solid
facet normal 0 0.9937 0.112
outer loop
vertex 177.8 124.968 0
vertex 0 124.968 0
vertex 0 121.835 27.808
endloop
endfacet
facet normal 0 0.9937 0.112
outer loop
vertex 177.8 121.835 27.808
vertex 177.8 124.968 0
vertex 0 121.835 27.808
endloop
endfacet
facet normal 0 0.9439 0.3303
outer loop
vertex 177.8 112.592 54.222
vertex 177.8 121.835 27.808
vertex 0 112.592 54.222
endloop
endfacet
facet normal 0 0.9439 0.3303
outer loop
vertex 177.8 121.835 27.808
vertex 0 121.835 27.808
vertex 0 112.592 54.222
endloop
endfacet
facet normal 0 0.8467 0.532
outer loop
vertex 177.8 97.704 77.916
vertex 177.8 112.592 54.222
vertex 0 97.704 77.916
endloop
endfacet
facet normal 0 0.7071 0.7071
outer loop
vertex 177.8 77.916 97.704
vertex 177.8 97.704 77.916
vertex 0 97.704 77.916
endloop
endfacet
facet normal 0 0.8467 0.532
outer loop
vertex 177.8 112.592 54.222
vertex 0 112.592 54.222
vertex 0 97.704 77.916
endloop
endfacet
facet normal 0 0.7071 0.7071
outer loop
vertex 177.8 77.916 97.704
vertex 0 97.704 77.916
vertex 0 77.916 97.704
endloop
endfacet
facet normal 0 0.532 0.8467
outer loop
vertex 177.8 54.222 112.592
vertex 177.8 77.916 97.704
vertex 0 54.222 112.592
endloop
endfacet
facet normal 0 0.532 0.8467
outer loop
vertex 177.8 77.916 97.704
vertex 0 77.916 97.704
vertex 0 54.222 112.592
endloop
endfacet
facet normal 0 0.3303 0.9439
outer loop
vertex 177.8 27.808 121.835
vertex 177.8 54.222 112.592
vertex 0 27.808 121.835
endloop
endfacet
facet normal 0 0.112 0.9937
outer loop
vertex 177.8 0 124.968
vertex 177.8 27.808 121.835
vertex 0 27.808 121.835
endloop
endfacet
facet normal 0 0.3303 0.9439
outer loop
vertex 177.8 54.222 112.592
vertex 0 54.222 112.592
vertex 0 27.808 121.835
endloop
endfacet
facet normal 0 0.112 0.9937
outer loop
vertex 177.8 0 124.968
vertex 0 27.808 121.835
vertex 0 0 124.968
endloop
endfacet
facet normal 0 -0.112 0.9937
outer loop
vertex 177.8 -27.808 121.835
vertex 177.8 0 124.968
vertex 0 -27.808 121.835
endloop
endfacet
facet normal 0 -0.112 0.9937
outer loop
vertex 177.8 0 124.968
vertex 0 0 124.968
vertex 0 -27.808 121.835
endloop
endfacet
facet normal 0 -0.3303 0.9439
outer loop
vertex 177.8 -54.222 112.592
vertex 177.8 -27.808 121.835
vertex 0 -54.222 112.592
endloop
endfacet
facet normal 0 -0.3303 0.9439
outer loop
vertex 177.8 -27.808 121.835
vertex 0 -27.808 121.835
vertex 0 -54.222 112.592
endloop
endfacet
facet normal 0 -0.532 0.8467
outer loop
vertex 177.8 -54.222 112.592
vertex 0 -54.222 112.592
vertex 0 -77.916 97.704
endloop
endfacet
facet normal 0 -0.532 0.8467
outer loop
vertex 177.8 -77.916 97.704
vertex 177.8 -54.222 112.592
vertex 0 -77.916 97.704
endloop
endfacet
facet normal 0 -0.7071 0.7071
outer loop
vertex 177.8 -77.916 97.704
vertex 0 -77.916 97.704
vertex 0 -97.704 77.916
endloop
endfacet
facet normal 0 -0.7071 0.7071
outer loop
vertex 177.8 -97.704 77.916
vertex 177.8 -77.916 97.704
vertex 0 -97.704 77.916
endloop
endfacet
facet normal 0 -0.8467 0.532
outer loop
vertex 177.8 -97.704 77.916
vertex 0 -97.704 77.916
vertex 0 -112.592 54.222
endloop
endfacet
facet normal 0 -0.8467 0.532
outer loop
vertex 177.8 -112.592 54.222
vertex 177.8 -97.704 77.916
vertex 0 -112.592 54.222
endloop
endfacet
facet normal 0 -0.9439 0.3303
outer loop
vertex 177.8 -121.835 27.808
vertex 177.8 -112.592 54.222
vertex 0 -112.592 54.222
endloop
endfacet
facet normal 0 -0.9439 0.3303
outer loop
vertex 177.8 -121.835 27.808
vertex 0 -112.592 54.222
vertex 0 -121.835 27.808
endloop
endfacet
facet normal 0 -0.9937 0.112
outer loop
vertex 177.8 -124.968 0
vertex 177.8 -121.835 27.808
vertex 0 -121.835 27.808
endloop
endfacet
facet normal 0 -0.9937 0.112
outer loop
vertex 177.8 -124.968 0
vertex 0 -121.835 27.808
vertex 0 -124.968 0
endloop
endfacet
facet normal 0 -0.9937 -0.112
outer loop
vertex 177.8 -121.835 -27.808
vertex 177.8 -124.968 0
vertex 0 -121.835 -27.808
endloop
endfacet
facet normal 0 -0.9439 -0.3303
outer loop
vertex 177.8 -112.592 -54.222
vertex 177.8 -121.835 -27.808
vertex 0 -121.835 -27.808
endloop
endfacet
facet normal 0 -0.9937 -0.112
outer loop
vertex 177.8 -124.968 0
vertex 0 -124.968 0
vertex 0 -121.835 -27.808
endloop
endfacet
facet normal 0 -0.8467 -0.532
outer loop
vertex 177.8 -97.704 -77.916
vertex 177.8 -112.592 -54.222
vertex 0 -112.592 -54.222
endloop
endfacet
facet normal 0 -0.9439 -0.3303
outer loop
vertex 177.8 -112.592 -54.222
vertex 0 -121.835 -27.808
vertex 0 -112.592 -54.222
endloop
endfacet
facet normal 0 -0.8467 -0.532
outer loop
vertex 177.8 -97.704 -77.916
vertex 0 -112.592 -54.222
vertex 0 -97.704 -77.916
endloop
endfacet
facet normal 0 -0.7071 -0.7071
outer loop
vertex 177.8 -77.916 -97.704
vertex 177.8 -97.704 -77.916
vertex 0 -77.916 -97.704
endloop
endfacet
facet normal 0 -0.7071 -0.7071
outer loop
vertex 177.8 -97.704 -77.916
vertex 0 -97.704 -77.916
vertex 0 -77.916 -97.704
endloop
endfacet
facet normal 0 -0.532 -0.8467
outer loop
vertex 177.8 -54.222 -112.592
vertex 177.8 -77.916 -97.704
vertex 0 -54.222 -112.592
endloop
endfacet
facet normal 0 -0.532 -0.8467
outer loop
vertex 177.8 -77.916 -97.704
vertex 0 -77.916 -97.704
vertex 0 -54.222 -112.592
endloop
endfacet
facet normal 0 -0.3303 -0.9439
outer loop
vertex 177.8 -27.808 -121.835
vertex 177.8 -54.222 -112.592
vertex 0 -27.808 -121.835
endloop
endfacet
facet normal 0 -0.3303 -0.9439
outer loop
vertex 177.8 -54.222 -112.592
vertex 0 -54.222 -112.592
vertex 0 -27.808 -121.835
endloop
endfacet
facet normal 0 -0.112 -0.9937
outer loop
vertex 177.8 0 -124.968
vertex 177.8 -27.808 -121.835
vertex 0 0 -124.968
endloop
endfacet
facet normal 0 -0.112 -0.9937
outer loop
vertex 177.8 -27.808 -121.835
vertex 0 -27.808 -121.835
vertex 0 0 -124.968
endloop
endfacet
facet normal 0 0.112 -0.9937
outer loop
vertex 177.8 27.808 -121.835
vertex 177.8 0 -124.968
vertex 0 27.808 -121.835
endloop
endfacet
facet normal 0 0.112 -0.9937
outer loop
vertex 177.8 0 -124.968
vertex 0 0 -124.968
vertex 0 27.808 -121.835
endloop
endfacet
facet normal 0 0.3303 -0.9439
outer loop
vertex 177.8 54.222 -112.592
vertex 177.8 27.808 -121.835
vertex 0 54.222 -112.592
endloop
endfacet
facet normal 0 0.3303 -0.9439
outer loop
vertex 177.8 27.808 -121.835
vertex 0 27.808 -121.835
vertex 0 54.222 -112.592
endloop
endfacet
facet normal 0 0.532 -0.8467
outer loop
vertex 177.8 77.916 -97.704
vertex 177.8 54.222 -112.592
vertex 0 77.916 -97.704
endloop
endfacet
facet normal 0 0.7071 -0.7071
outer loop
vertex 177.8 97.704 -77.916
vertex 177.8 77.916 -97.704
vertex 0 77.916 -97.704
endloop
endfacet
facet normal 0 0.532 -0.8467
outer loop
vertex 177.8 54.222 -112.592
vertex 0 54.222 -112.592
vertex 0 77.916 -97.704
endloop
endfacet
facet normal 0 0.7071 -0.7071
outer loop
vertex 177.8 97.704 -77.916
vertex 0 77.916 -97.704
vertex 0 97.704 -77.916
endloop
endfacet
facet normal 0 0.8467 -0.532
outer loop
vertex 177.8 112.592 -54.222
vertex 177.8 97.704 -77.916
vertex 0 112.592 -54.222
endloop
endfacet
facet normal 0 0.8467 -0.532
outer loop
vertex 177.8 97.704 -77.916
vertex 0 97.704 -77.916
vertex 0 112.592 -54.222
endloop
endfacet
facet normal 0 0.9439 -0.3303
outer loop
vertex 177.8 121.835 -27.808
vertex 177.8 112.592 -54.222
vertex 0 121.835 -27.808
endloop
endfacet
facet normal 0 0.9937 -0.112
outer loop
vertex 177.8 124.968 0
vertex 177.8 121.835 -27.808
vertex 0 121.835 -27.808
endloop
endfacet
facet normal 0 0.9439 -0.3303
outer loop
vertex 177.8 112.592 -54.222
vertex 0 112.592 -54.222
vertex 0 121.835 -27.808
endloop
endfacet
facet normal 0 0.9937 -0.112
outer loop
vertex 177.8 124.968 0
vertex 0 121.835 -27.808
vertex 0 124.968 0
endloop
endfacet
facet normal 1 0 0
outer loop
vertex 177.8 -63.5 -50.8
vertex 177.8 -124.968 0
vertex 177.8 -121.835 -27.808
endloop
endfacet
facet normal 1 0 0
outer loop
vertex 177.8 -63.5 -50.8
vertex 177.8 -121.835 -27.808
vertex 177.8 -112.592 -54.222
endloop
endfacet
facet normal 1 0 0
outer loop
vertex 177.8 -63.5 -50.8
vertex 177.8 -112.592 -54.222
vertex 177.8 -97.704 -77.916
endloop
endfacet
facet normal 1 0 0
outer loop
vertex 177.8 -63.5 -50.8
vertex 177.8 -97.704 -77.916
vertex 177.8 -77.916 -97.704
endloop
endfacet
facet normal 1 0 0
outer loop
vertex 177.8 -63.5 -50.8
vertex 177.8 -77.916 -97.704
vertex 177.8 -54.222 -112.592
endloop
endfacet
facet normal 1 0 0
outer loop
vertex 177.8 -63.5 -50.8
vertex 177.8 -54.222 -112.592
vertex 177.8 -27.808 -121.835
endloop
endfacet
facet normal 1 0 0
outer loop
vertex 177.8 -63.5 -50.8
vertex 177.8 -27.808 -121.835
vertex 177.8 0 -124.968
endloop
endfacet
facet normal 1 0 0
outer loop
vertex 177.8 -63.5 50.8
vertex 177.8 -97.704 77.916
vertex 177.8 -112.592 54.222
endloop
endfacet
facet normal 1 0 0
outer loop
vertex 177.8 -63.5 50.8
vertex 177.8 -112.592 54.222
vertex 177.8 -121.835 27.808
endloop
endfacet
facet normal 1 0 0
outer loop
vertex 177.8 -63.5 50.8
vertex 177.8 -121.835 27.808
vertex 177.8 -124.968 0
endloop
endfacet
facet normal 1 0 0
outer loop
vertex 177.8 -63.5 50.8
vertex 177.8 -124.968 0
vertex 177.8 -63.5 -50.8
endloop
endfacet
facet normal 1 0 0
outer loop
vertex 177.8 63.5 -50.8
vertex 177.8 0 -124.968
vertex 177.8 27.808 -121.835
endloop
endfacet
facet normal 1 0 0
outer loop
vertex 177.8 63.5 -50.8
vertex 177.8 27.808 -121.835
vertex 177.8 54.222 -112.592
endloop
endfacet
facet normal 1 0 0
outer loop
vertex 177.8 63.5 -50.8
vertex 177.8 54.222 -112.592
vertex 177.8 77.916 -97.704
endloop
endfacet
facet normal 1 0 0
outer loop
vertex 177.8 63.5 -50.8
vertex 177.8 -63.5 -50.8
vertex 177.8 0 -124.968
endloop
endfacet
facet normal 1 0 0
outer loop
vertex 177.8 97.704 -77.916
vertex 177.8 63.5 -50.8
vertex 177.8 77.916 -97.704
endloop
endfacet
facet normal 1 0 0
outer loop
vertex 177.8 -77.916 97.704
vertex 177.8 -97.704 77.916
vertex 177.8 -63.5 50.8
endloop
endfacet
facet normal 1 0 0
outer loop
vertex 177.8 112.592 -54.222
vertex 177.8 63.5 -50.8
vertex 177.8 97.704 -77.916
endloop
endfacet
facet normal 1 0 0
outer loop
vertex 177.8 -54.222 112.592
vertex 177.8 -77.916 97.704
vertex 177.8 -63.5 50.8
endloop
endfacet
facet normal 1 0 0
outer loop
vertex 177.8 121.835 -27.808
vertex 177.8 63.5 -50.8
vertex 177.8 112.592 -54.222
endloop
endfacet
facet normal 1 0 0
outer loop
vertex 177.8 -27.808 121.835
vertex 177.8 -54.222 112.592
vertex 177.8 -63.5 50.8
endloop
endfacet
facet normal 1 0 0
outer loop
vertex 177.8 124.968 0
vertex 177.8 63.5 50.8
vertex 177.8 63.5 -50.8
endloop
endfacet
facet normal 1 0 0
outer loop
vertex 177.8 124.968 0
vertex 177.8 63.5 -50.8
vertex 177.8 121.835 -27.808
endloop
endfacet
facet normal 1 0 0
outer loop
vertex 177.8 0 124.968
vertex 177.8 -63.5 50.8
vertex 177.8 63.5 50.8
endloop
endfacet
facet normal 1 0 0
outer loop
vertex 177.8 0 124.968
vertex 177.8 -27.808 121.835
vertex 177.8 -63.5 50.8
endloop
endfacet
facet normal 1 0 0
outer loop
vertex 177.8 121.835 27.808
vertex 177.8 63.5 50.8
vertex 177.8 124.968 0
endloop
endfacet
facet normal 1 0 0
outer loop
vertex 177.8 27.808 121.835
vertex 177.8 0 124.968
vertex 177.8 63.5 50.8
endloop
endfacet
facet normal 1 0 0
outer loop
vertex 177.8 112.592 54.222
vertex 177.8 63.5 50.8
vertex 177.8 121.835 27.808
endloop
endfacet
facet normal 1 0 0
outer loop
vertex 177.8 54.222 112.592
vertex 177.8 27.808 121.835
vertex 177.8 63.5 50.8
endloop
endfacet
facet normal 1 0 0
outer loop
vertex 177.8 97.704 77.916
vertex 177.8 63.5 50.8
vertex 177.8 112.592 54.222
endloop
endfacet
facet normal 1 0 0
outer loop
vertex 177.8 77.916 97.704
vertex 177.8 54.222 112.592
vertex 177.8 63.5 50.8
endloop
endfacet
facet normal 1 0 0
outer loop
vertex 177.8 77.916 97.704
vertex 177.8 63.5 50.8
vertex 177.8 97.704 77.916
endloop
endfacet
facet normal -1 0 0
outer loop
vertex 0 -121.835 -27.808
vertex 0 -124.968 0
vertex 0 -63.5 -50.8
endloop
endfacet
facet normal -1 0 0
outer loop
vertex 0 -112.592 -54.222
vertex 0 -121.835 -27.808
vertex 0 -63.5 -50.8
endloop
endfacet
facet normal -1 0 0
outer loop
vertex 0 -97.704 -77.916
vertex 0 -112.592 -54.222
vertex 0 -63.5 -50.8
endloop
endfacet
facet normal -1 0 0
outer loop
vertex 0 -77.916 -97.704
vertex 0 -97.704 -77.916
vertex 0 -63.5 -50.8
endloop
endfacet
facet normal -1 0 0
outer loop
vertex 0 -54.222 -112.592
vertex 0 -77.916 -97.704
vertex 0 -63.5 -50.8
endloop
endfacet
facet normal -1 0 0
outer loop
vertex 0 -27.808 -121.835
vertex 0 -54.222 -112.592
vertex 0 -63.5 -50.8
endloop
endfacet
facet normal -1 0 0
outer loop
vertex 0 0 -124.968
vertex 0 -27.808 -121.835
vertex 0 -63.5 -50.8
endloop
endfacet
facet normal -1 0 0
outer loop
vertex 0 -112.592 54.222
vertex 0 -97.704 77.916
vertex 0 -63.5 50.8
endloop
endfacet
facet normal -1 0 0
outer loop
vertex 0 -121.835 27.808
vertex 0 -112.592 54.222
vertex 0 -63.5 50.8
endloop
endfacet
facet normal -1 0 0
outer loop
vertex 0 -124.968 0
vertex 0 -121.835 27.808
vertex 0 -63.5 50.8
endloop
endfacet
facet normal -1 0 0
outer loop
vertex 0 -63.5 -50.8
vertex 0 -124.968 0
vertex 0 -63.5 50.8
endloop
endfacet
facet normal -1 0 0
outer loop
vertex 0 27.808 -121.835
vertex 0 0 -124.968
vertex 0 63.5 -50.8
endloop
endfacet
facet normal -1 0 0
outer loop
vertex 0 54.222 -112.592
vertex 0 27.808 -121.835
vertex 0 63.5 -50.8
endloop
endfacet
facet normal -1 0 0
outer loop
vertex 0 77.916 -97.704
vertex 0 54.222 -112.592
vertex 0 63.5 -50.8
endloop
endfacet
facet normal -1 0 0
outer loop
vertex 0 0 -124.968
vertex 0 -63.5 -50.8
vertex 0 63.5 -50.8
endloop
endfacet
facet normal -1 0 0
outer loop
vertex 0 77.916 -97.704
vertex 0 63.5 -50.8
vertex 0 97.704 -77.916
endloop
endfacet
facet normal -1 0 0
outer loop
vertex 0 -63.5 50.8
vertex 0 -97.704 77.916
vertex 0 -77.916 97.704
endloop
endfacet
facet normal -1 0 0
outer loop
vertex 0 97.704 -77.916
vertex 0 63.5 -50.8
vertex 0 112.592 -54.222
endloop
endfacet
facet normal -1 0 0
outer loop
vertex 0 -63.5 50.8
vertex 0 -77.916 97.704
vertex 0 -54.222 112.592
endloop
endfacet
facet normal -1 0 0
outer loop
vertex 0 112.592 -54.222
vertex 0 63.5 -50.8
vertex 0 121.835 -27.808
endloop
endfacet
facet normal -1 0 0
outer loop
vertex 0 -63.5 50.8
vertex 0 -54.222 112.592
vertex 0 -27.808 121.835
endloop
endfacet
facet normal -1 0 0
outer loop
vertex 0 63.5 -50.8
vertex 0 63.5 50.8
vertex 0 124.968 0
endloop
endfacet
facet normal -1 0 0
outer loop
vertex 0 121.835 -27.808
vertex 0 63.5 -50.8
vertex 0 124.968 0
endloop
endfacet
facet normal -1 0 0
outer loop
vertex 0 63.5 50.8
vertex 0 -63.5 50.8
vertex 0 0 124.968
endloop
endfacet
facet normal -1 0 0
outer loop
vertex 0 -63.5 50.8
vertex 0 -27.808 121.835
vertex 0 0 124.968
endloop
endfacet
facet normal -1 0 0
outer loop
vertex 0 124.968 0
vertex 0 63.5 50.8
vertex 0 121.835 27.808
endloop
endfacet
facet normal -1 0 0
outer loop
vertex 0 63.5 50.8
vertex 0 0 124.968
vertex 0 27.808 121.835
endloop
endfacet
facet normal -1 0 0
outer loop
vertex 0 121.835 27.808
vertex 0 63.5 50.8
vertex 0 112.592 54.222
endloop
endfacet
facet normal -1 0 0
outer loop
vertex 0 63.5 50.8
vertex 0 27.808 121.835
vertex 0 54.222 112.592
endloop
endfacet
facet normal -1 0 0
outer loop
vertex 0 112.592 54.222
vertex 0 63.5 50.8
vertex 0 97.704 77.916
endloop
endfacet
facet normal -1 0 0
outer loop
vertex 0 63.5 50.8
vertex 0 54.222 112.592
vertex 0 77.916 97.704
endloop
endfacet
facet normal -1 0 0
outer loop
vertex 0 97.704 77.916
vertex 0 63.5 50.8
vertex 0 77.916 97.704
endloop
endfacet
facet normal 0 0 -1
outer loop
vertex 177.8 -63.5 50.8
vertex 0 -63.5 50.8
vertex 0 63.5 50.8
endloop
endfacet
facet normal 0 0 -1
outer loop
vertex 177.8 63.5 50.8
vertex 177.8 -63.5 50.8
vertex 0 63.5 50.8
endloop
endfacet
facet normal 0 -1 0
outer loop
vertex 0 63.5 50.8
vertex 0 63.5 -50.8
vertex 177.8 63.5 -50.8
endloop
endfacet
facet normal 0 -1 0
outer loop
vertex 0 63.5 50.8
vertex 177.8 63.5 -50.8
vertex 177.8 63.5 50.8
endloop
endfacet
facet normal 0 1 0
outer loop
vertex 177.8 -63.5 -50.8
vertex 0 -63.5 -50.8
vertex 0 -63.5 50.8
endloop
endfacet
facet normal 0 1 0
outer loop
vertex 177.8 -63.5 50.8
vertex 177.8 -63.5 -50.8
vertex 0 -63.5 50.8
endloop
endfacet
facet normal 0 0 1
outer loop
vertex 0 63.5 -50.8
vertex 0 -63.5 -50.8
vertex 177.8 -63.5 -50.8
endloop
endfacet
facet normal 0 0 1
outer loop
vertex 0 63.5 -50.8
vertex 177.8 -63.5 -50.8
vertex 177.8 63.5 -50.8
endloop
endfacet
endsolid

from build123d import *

# Parameters (mm, degrees)
F0_R     = 124.968
F0_W     = 127
F0_H     = 101.6
F1_DEPTH = 177.8


with BuildPart() as f1:
    # F0 (on Right) → F1 (new body)
    with BuildSketch(Plane.YZ):
        Circle(F0_R)
        Rectangle(F0_W, F0_H, mode=Mode.SUBTRACT)
    extrude(amount=F1_DEPTH)


solid = f1.part
